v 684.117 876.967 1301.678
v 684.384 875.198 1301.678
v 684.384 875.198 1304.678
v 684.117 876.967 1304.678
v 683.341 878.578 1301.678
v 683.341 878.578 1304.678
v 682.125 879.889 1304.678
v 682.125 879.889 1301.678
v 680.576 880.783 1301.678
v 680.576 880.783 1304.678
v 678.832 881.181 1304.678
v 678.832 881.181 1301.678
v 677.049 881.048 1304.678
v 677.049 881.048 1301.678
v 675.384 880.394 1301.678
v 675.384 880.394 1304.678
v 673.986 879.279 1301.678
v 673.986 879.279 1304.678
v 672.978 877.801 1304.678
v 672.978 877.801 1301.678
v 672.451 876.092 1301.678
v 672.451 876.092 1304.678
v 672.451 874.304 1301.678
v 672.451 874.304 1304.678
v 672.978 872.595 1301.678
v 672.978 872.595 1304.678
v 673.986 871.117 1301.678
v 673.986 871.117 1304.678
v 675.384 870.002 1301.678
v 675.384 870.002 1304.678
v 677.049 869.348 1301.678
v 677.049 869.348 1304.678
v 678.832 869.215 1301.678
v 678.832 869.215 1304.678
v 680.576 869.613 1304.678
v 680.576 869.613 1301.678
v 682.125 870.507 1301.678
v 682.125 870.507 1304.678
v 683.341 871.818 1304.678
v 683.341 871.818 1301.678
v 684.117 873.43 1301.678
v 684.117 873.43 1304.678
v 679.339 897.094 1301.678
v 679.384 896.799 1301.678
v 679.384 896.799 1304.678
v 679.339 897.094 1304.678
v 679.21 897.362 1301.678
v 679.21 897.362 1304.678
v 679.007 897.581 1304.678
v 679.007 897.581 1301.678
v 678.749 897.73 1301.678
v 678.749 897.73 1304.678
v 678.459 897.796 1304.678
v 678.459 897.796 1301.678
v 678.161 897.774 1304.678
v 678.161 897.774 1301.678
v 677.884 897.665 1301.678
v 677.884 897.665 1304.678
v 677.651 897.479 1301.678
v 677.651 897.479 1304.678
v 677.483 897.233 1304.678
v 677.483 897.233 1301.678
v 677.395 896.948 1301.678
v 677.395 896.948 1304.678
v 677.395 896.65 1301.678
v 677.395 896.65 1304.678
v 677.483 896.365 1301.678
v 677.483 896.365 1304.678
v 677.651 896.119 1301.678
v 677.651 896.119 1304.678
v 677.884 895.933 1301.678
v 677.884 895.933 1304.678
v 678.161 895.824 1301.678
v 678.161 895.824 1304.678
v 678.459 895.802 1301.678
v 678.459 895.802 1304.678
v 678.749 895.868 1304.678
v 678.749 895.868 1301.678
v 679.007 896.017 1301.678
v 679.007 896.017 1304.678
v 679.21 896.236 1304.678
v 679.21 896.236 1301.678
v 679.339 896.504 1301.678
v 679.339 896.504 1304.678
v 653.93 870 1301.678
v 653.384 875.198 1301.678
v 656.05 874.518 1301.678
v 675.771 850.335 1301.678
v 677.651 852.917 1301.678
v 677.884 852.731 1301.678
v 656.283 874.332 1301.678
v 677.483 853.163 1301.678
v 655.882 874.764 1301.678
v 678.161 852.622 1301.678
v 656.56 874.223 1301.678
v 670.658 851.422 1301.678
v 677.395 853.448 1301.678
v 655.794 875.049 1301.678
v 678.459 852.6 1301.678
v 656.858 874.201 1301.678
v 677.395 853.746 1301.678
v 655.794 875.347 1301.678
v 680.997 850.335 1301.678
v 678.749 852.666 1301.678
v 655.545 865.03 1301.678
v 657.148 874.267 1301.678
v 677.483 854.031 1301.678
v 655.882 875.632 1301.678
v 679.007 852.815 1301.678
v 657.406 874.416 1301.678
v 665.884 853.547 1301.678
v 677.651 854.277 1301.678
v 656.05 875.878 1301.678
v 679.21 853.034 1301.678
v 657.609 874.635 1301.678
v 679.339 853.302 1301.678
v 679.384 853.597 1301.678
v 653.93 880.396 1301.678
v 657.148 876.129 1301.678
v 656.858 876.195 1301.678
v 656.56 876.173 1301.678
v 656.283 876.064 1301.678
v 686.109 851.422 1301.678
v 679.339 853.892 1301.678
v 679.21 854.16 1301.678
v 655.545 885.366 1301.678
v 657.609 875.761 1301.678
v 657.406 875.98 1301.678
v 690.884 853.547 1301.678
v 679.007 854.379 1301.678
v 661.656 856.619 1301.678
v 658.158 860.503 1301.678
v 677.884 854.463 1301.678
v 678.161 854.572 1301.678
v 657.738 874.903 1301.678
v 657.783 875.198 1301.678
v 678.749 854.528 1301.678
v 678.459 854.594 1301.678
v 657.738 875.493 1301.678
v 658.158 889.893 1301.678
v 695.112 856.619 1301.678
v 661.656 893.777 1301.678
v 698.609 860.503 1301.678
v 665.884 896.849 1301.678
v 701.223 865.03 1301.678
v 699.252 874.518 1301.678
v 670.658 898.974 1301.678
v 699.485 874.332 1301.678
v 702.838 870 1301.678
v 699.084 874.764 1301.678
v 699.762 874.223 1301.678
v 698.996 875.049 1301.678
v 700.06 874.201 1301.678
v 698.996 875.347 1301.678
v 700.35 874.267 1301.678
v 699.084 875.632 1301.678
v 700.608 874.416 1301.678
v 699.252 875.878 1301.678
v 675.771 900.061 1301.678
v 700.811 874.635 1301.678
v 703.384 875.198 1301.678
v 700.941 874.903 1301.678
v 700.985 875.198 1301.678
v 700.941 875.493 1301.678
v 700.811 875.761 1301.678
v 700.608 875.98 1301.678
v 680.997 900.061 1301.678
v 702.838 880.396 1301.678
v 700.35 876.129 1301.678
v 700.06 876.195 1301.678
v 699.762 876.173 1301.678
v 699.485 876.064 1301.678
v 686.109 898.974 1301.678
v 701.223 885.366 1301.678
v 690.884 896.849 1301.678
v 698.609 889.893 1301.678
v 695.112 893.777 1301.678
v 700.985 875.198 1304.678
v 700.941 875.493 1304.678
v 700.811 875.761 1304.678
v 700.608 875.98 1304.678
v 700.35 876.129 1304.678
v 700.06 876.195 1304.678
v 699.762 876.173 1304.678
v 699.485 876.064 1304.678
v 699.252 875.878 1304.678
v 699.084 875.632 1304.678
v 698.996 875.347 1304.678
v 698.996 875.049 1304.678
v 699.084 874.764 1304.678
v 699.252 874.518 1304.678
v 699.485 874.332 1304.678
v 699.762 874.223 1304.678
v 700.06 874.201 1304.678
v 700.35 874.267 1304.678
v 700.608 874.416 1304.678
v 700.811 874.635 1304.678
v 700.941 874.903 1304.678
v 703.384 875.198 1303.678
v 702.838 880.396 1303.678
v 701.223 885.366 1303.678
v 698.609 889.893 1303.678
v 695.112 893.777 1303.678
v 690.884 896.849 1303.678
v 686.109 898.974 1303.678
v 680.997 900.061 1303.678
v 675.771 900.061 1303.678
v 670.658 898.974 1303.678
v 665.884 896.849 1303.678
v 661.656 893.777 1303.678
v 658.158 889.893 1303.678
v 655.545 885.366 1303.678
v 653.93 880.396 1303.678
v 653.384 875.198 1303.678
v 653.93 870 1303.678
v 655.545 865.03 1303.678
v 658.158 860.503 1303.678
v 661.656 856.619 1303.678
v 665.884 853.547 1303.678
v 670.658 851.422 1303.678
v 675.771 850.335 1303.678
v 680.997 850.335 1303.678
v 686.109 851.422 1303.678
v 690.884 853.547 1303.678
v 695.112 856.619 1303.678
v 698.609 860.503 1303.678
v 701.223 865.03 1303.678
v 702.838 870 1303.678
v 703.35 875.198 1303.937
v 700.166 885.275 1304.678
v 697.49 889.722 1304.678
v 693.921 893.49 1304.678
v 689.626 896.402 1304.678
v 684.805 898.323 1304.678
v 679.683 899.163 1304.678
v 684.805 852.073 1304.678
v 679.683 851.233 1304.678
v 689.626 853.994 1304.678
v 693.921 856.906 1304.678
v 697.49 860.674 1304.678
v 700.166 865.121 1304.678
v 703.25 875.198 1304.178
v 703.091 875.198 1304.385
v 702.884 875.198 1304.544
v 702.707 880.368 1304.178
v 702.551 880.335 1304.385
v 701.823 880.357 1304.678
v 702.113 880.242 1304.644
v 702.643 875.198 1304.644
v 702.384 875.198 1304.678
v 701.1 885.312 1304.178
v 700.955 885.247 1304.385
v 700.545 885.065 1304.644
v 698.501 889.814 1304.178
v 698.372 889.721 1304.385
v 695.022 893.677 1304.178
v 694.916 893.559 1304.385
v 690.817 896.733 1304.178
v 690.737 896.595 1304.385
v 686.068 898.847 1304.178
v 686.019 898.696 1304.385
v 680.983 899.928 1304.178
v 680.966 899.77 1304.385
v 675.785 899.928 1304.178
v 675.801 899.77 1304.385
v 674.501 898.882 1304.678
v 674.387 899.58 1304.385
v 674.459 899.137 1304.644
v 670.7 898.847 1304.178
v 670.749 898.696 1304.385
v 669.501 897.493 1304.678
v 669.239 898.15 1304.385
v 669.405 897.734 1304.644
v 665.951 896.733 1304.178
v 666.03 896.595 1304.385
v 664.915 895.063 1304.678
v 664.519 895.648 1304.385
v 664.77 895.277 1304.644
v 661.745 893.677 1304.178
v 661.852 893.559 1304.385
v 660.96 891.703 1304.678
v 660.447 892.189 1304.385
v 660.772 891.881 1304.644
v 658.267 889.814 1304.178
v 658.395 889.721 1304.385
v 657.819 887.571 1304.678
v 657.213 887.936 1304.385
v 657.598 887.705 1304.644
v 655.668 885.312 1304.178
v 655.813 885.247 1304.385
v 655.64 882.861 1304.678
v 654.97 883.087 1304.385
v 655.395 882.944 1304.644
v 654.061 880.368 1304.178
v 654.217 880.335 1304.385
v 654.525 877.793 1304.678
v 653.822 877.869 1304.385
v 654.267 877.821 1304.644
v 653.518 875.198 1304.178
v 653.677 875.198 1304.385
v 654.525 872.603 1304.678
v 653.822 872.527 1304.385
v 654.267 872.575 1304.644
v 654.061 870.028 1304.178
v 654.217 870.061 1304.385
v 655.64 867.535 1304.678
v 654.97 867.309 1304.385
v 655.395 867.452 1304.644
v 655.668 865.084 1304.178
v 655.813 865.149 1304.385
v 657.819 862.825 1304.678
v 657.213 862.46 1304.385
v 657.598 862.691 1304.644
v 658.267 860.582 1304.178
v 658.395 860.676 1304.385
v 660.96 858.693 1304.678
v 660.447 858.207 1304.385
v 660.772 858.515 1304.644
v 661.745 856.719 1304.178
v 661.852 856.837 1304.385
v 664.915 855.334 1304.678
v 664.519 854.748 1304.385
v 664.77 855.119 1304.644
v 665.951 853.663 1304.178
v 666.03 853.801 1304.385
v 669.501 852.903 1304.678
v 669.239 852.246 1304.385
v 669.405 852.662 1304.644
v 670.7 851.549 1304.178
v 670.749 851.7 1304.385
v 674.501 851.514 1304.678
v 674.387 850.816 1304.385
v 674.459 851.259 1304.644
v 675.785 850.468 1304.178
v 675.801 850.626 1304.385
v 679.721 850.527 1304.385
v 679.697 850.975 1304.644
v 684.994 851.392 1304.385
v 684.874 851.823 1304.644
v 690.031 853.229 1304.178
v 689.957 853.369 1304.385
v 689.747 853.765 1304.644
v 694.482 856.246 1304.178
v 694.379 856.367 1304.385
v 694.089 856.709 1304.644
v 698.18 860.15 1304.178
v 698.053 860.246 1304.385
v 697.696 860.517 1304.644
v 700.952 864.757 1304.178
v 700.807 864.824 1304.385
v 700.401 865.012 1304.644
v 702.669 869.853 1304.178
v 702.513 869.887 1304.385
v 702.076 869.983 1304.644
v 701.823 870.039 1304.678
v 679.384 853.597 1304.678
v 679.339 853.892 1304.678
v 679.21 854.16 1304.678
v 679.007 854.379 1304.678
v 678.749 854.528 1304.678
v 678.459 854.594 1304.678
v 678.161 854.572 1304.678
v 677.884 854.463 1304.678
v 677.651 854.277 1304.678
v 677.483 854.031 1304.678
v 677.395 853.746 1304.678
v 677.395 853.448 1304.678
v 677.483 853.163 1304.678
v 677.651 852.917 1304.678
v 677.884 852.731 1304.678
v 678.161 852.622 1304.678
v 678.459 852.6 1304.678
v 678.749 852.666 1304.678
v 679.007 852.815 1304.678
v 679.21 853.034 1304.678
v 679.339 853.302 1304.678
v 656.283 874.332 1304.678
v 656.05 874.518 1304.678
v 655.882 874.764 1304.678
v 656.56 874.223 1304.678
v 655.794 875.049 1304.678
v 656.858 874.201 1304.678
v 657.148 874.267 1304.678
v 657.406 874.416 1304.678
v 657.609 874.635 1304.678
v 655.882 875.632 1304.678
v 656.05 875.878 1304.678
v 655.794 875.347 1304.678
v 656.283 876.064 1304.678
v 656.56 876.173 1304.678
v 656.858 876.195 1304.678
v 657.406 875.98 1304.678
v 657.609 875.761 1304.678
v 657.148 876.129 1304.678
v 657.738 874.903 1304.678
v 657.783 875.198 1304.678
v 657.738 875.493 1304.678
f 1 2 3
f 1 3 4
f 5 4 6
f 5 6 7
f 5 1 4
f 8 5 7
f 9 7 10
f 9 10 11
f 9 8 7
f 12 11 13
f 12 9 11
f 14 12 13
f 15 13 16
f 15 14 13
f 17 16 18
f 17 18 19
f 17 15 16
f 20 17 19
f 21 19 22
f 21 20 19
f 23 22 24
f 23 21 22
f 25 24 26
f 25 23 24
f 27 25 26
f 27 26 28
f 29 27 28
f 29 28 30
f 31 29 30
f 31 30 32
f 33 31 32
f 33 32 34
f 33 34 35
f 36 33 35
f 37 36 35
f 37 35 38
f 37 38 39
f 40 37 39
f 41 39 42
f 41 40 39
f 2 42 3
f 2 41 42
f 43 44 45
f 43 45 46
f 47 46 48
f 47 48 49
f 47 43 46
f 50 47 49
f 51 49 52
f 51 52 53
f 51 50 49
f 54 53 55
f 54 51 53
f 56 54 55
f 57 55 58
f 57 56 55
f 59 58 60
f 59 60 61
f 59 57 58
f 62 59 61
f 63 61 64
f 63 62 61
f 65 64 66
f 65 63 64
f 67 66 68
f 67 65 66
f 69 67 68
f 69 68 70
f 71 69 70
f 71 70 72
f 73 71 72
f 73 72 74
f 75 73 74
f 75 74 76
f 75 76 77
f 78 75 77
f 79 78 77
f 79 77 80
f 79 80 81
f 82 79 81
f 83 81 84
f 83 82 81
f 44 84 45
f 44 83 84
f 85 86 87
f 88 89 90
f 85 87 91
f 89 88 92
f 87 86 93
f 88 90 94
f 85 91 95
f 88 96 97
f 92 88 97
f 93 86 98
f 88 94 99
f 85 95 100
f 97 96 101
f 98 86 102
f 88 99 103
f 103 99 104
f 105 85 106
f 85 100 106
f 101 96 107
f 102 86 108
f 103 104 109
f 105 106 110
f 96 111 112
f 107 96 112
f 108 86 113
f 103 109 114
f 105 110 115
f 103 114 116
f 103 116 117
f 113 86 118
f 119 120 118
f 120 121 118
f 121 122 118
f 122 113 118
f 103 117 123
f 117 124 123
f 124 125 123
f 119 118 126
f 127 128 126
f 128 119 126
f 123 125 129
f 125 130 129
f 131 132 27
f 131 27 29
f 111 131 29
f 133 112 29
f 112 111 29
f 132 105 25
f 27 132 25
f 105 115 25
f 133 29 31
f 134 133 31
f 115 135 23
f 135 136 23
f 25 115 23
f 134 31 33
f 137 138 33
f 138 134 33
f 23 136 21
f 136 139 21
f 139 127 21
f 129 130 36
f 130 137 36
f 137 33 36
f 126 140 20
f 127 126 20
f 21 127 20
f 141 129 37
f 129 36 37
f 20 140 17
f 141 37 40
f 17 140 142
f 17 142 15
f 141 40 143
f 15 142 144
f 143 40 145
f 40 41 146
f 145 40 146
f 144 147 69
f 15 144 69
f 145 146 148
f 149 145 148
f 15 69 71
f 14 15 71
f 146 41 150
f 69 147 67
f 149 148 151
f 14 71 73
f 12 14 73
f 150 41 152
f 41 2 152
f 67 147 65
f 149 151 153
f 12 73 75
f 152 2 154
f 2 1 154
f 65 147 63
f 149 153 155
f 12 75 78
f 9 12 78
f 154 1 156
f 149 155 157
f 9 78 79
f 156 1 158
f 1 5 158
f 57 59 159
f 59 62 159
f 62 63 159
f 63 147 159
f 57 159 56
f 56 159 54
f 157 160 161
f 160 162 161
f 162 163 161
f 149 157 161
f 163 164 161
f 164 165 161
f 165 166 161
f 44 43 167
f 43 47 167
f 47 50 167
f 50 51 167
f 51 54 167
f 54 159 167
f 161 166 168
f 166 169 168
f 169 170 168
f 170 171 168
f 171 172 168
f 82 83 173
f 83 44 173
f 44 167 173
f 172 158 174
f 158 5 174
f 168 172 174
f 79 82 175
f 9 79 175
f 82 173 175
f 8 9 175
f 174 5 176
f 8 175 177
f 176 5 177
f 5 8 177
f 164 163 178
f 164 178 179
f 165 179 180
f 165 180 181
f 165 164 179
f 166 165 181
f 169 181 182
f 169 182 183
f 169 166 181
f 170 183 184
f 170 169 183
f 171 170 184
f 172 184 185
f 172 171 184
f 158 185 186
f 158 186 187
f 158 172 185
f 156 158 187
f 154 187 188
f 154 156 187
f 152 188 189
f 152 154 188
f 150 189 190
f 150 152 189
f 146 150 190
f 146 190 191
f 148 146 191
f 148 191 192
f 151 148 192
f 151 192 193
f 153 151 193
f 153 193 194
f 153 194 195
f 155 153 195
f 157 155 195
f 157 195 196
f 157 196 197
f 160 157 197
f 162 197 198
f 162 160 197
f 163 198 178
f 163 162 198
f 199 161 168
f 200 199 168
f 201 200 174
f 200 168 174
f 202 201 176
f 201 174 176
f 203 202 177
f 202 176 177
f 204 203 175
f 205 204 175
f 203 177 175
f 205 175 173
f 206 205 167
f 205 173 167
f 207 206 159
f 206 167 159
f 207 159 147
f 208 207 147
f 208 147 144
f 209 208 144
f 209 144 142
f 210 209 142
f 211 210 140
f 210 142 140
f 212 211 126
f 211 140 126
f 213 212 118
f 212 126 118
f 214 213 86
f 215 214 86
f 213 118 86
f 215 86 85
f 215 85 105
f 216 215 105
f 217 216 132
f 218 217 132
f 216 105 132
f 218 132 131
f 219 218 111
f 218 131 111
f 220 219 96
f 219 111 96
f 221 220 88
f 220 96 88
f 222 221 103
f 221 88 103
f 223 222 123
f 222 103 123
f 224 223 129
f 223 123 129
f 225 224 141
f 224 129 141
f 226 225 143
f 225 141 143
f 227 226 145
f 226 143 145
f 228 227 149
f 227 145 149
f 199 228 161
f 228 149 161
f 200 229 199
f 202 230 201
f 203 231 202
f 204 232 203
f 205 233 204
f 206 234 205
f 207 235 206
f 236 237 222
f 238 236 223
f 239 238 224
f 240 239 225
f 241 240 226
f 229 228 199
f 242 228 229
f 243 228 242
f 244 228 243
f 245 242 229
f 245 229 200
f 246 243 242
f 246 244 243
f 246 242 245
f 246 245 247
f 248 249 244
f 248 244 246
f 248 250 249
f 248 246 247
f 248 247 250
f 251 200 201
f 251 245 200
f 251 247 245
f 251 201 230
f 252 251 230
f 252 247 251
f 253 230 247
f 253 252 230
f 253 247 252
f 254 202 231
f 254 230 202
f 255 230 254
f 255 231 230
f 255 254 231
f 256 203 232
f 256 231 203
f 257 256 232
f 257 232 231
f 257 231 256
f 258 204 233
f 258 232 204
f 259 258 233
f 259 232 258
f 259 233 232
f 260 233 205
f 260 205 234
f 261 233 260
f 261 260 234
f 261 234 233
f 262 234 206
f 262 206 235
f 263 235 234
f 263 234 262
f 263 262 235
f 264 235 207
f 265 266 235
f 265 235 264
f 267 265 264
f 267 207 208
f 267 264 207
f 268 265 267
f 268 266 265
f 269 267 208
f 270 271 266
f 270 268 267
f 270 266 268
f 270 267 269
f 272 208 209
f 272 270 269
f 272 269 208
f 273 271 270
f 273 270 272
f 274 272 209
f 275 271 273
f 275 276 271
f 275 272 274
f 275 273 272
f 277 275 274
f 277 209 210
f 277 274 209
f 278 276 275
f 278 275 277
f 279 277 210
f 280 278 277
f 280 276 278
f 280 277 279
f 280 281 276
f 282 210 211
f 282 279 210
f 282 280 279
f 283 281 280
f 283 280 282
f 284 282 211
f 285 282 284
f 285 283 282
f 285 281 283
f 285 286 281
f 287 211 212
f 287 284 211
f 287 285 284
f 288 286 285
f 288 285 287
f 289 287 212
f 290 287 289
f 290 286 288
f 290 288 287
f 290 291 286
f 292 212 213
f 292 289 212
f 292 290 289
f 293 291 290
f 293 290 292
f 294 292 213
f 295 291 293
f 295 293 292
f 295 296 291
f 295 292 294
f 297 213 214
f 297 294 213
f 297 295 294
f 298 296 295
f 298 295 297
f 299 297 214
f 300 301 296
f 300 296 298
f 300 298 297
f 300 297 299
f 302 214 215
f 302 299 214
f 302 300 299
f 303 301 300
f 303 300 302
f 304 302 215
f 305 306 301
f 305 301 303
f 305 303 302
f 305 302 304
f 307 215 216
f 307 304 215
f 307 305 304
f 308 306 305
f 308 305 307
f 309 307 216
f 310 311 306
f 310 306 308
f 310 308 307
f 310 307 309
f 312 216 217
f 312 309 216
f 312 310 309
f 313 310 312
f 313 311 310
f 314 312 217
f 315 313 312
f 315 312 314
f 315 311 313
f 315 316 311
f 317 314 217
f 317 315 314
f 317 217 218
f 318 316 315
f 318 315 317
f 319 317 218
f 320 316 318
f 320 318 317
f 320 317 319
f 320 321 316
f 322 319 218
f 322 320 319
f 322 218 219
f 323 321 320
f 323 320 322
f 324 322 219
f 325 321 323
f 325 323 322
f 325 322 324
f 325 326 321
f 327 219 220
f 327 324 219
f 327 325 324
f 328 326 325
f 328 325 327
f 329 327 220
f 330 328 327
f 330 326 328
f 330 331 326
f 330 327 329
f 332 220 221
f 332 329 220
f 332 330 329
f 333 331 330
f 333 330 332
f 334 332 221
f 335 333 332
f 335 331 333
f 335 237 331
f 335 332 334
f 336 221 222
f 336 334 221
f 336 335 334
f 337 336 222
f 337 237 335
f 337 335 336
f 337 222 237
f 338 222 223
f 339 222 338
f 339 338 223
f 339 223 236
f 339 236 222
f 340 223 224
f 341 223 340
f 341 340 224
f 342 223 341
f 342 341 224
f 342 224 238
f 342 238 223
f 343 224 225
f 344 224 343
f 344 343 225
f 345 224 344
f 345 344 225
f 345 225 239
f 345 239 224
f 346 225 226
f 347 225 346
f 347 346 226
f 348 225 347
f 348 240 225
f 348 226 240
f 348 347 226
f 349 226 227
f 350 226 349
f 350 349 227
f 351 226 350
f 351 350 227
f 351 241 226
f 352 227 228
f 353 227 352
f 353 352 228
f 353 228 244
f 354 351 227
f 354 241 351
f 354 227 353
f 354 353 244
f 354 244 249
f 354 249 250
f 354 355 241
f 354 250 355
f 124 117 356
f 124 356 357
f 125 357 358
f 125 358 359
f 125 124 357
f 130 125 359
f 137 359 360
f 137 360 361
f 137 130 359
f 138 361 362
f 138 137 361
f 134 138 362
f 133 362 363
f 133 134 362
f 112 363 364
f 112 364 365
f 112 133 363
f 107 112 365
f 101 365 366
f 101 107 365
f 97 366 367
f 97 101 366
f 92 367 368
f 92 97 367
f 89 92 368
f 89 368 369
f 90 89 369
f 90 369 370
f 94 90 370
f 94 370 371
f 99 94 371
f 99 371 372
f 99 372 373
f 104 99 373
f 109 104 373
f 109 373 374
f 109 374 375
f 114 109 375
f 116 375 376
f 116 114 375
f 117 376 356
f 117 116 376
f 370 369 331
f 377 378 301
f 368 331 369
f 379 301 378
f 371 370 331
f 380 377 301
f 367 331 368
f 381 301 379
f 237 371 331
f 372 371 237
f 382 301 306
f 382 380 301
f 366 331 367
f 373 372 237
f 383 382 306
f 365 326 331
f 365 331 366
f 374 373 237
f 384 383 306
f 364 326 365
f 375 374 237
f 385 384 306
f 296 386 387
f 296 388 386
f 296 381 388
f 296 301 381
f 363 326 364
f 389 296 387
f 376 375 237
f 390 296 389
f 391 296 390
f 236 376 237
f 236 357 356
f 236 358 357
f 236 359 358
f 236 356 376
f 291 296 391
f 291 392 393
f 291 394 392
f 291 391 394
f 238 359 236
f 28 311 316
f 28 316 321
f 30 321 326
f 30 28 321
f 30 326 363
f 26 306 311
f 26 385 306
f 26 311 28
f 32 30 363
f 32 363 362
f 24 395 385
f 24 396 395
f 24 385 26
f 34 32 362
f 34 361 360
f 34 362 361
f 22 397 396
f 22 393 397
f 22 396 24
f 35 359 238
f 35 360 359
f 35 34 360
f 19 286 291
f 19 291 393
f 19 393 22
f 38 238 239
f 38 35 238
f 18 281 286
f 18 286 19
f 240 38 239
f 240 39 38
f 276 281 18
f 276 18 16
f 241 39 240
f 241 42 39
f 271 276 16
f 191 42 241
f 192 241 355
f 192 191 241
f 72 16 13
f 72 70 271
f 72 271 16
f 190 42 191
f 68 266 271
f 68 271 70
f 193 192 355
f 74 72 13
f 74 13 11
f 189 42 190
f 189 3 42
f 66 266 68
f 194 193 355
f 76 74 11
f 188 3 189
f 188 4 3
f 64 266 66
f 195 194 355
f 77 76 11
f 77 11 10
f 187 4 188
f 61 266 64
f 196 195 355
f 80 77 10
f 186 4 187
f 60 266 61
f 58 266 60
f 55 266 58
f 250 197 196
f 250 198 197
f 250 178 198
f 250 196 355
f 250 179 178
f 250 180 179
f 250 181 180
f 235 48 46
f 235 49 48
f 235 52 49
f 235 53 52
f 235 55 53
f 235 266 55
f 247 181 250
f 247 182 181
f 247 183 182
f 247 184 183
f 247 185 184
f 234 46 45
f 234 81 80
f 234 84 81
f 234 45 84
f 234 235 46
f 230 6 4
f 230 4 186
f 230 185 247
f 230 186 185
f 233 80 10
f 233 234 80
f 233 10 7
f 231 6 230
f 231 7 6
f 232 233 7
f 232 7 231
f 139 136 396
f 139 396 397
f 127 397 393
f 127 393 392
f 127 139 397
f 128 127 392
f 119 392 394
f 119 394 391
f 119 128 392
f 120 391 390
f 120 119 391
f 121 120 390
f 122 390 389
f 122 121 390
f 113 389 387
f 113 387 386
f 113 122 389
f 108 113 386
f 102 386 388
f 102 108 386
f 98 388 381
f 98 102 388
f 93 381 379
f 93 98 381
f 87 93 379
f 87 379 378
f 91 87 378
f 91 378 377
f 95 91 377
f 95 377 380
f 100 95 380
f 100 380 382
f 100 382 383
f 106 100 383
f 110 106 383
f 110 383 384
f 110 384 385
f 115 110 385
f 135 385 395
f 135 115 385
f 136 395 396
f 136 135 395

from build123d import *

# Parameters (mm, degrees)
SKETCH1_R           = 25
SKETCH1_R_2         = 6
SKETCH1_R_3         = 1
BOSS_EXTRUDE1_DEPTH = 3
FILLET1_R           = 1


with BuildPart() as part:
    # Sketch1 → Boss-Extrude1 (new body)
    with BuildSketch(Plane.XY.offset(1301.677843453)):
        with Locations((678.383867879, 875.198049015)):
            Circle(SKETCH1_R)
        with Locations((678.383867879, 875.198049015)):
            Circle(SKETCH1_R_2, mode=Mode.SUBTRACT)
        with Locations((678.383867879, 896.799115491)):
            Circle(SKETCH1_R_3, mode=Mode.SUBTRACT)
        with Locations((678.383867879, 853.59698254)):
            Circle(SKETCH1_R_3, mode=Mode.SUBTRACT)
        with Locations((699.984934354, 875.198049015)):
            Circle(SKETCH1_R_3, mode=Mode.SUBTRACT)
        with Locations((656.782801404, 875.198049015)):
            Circle(SKETCH1_R_3, mode=Mode.SUBTRACT)
    extrude(amount=BOSS_EXTRUDE1_DEPTH)

    # Fillet1
    fillet1_edges = [part.edges().sort_by_distance(p)[0] for p in [
        (653.383867879, 875.198049015, 1304.677843453),
    ]]
    fillet(fillet1_edges, radius=FILLET1_R)


solid = part.part
